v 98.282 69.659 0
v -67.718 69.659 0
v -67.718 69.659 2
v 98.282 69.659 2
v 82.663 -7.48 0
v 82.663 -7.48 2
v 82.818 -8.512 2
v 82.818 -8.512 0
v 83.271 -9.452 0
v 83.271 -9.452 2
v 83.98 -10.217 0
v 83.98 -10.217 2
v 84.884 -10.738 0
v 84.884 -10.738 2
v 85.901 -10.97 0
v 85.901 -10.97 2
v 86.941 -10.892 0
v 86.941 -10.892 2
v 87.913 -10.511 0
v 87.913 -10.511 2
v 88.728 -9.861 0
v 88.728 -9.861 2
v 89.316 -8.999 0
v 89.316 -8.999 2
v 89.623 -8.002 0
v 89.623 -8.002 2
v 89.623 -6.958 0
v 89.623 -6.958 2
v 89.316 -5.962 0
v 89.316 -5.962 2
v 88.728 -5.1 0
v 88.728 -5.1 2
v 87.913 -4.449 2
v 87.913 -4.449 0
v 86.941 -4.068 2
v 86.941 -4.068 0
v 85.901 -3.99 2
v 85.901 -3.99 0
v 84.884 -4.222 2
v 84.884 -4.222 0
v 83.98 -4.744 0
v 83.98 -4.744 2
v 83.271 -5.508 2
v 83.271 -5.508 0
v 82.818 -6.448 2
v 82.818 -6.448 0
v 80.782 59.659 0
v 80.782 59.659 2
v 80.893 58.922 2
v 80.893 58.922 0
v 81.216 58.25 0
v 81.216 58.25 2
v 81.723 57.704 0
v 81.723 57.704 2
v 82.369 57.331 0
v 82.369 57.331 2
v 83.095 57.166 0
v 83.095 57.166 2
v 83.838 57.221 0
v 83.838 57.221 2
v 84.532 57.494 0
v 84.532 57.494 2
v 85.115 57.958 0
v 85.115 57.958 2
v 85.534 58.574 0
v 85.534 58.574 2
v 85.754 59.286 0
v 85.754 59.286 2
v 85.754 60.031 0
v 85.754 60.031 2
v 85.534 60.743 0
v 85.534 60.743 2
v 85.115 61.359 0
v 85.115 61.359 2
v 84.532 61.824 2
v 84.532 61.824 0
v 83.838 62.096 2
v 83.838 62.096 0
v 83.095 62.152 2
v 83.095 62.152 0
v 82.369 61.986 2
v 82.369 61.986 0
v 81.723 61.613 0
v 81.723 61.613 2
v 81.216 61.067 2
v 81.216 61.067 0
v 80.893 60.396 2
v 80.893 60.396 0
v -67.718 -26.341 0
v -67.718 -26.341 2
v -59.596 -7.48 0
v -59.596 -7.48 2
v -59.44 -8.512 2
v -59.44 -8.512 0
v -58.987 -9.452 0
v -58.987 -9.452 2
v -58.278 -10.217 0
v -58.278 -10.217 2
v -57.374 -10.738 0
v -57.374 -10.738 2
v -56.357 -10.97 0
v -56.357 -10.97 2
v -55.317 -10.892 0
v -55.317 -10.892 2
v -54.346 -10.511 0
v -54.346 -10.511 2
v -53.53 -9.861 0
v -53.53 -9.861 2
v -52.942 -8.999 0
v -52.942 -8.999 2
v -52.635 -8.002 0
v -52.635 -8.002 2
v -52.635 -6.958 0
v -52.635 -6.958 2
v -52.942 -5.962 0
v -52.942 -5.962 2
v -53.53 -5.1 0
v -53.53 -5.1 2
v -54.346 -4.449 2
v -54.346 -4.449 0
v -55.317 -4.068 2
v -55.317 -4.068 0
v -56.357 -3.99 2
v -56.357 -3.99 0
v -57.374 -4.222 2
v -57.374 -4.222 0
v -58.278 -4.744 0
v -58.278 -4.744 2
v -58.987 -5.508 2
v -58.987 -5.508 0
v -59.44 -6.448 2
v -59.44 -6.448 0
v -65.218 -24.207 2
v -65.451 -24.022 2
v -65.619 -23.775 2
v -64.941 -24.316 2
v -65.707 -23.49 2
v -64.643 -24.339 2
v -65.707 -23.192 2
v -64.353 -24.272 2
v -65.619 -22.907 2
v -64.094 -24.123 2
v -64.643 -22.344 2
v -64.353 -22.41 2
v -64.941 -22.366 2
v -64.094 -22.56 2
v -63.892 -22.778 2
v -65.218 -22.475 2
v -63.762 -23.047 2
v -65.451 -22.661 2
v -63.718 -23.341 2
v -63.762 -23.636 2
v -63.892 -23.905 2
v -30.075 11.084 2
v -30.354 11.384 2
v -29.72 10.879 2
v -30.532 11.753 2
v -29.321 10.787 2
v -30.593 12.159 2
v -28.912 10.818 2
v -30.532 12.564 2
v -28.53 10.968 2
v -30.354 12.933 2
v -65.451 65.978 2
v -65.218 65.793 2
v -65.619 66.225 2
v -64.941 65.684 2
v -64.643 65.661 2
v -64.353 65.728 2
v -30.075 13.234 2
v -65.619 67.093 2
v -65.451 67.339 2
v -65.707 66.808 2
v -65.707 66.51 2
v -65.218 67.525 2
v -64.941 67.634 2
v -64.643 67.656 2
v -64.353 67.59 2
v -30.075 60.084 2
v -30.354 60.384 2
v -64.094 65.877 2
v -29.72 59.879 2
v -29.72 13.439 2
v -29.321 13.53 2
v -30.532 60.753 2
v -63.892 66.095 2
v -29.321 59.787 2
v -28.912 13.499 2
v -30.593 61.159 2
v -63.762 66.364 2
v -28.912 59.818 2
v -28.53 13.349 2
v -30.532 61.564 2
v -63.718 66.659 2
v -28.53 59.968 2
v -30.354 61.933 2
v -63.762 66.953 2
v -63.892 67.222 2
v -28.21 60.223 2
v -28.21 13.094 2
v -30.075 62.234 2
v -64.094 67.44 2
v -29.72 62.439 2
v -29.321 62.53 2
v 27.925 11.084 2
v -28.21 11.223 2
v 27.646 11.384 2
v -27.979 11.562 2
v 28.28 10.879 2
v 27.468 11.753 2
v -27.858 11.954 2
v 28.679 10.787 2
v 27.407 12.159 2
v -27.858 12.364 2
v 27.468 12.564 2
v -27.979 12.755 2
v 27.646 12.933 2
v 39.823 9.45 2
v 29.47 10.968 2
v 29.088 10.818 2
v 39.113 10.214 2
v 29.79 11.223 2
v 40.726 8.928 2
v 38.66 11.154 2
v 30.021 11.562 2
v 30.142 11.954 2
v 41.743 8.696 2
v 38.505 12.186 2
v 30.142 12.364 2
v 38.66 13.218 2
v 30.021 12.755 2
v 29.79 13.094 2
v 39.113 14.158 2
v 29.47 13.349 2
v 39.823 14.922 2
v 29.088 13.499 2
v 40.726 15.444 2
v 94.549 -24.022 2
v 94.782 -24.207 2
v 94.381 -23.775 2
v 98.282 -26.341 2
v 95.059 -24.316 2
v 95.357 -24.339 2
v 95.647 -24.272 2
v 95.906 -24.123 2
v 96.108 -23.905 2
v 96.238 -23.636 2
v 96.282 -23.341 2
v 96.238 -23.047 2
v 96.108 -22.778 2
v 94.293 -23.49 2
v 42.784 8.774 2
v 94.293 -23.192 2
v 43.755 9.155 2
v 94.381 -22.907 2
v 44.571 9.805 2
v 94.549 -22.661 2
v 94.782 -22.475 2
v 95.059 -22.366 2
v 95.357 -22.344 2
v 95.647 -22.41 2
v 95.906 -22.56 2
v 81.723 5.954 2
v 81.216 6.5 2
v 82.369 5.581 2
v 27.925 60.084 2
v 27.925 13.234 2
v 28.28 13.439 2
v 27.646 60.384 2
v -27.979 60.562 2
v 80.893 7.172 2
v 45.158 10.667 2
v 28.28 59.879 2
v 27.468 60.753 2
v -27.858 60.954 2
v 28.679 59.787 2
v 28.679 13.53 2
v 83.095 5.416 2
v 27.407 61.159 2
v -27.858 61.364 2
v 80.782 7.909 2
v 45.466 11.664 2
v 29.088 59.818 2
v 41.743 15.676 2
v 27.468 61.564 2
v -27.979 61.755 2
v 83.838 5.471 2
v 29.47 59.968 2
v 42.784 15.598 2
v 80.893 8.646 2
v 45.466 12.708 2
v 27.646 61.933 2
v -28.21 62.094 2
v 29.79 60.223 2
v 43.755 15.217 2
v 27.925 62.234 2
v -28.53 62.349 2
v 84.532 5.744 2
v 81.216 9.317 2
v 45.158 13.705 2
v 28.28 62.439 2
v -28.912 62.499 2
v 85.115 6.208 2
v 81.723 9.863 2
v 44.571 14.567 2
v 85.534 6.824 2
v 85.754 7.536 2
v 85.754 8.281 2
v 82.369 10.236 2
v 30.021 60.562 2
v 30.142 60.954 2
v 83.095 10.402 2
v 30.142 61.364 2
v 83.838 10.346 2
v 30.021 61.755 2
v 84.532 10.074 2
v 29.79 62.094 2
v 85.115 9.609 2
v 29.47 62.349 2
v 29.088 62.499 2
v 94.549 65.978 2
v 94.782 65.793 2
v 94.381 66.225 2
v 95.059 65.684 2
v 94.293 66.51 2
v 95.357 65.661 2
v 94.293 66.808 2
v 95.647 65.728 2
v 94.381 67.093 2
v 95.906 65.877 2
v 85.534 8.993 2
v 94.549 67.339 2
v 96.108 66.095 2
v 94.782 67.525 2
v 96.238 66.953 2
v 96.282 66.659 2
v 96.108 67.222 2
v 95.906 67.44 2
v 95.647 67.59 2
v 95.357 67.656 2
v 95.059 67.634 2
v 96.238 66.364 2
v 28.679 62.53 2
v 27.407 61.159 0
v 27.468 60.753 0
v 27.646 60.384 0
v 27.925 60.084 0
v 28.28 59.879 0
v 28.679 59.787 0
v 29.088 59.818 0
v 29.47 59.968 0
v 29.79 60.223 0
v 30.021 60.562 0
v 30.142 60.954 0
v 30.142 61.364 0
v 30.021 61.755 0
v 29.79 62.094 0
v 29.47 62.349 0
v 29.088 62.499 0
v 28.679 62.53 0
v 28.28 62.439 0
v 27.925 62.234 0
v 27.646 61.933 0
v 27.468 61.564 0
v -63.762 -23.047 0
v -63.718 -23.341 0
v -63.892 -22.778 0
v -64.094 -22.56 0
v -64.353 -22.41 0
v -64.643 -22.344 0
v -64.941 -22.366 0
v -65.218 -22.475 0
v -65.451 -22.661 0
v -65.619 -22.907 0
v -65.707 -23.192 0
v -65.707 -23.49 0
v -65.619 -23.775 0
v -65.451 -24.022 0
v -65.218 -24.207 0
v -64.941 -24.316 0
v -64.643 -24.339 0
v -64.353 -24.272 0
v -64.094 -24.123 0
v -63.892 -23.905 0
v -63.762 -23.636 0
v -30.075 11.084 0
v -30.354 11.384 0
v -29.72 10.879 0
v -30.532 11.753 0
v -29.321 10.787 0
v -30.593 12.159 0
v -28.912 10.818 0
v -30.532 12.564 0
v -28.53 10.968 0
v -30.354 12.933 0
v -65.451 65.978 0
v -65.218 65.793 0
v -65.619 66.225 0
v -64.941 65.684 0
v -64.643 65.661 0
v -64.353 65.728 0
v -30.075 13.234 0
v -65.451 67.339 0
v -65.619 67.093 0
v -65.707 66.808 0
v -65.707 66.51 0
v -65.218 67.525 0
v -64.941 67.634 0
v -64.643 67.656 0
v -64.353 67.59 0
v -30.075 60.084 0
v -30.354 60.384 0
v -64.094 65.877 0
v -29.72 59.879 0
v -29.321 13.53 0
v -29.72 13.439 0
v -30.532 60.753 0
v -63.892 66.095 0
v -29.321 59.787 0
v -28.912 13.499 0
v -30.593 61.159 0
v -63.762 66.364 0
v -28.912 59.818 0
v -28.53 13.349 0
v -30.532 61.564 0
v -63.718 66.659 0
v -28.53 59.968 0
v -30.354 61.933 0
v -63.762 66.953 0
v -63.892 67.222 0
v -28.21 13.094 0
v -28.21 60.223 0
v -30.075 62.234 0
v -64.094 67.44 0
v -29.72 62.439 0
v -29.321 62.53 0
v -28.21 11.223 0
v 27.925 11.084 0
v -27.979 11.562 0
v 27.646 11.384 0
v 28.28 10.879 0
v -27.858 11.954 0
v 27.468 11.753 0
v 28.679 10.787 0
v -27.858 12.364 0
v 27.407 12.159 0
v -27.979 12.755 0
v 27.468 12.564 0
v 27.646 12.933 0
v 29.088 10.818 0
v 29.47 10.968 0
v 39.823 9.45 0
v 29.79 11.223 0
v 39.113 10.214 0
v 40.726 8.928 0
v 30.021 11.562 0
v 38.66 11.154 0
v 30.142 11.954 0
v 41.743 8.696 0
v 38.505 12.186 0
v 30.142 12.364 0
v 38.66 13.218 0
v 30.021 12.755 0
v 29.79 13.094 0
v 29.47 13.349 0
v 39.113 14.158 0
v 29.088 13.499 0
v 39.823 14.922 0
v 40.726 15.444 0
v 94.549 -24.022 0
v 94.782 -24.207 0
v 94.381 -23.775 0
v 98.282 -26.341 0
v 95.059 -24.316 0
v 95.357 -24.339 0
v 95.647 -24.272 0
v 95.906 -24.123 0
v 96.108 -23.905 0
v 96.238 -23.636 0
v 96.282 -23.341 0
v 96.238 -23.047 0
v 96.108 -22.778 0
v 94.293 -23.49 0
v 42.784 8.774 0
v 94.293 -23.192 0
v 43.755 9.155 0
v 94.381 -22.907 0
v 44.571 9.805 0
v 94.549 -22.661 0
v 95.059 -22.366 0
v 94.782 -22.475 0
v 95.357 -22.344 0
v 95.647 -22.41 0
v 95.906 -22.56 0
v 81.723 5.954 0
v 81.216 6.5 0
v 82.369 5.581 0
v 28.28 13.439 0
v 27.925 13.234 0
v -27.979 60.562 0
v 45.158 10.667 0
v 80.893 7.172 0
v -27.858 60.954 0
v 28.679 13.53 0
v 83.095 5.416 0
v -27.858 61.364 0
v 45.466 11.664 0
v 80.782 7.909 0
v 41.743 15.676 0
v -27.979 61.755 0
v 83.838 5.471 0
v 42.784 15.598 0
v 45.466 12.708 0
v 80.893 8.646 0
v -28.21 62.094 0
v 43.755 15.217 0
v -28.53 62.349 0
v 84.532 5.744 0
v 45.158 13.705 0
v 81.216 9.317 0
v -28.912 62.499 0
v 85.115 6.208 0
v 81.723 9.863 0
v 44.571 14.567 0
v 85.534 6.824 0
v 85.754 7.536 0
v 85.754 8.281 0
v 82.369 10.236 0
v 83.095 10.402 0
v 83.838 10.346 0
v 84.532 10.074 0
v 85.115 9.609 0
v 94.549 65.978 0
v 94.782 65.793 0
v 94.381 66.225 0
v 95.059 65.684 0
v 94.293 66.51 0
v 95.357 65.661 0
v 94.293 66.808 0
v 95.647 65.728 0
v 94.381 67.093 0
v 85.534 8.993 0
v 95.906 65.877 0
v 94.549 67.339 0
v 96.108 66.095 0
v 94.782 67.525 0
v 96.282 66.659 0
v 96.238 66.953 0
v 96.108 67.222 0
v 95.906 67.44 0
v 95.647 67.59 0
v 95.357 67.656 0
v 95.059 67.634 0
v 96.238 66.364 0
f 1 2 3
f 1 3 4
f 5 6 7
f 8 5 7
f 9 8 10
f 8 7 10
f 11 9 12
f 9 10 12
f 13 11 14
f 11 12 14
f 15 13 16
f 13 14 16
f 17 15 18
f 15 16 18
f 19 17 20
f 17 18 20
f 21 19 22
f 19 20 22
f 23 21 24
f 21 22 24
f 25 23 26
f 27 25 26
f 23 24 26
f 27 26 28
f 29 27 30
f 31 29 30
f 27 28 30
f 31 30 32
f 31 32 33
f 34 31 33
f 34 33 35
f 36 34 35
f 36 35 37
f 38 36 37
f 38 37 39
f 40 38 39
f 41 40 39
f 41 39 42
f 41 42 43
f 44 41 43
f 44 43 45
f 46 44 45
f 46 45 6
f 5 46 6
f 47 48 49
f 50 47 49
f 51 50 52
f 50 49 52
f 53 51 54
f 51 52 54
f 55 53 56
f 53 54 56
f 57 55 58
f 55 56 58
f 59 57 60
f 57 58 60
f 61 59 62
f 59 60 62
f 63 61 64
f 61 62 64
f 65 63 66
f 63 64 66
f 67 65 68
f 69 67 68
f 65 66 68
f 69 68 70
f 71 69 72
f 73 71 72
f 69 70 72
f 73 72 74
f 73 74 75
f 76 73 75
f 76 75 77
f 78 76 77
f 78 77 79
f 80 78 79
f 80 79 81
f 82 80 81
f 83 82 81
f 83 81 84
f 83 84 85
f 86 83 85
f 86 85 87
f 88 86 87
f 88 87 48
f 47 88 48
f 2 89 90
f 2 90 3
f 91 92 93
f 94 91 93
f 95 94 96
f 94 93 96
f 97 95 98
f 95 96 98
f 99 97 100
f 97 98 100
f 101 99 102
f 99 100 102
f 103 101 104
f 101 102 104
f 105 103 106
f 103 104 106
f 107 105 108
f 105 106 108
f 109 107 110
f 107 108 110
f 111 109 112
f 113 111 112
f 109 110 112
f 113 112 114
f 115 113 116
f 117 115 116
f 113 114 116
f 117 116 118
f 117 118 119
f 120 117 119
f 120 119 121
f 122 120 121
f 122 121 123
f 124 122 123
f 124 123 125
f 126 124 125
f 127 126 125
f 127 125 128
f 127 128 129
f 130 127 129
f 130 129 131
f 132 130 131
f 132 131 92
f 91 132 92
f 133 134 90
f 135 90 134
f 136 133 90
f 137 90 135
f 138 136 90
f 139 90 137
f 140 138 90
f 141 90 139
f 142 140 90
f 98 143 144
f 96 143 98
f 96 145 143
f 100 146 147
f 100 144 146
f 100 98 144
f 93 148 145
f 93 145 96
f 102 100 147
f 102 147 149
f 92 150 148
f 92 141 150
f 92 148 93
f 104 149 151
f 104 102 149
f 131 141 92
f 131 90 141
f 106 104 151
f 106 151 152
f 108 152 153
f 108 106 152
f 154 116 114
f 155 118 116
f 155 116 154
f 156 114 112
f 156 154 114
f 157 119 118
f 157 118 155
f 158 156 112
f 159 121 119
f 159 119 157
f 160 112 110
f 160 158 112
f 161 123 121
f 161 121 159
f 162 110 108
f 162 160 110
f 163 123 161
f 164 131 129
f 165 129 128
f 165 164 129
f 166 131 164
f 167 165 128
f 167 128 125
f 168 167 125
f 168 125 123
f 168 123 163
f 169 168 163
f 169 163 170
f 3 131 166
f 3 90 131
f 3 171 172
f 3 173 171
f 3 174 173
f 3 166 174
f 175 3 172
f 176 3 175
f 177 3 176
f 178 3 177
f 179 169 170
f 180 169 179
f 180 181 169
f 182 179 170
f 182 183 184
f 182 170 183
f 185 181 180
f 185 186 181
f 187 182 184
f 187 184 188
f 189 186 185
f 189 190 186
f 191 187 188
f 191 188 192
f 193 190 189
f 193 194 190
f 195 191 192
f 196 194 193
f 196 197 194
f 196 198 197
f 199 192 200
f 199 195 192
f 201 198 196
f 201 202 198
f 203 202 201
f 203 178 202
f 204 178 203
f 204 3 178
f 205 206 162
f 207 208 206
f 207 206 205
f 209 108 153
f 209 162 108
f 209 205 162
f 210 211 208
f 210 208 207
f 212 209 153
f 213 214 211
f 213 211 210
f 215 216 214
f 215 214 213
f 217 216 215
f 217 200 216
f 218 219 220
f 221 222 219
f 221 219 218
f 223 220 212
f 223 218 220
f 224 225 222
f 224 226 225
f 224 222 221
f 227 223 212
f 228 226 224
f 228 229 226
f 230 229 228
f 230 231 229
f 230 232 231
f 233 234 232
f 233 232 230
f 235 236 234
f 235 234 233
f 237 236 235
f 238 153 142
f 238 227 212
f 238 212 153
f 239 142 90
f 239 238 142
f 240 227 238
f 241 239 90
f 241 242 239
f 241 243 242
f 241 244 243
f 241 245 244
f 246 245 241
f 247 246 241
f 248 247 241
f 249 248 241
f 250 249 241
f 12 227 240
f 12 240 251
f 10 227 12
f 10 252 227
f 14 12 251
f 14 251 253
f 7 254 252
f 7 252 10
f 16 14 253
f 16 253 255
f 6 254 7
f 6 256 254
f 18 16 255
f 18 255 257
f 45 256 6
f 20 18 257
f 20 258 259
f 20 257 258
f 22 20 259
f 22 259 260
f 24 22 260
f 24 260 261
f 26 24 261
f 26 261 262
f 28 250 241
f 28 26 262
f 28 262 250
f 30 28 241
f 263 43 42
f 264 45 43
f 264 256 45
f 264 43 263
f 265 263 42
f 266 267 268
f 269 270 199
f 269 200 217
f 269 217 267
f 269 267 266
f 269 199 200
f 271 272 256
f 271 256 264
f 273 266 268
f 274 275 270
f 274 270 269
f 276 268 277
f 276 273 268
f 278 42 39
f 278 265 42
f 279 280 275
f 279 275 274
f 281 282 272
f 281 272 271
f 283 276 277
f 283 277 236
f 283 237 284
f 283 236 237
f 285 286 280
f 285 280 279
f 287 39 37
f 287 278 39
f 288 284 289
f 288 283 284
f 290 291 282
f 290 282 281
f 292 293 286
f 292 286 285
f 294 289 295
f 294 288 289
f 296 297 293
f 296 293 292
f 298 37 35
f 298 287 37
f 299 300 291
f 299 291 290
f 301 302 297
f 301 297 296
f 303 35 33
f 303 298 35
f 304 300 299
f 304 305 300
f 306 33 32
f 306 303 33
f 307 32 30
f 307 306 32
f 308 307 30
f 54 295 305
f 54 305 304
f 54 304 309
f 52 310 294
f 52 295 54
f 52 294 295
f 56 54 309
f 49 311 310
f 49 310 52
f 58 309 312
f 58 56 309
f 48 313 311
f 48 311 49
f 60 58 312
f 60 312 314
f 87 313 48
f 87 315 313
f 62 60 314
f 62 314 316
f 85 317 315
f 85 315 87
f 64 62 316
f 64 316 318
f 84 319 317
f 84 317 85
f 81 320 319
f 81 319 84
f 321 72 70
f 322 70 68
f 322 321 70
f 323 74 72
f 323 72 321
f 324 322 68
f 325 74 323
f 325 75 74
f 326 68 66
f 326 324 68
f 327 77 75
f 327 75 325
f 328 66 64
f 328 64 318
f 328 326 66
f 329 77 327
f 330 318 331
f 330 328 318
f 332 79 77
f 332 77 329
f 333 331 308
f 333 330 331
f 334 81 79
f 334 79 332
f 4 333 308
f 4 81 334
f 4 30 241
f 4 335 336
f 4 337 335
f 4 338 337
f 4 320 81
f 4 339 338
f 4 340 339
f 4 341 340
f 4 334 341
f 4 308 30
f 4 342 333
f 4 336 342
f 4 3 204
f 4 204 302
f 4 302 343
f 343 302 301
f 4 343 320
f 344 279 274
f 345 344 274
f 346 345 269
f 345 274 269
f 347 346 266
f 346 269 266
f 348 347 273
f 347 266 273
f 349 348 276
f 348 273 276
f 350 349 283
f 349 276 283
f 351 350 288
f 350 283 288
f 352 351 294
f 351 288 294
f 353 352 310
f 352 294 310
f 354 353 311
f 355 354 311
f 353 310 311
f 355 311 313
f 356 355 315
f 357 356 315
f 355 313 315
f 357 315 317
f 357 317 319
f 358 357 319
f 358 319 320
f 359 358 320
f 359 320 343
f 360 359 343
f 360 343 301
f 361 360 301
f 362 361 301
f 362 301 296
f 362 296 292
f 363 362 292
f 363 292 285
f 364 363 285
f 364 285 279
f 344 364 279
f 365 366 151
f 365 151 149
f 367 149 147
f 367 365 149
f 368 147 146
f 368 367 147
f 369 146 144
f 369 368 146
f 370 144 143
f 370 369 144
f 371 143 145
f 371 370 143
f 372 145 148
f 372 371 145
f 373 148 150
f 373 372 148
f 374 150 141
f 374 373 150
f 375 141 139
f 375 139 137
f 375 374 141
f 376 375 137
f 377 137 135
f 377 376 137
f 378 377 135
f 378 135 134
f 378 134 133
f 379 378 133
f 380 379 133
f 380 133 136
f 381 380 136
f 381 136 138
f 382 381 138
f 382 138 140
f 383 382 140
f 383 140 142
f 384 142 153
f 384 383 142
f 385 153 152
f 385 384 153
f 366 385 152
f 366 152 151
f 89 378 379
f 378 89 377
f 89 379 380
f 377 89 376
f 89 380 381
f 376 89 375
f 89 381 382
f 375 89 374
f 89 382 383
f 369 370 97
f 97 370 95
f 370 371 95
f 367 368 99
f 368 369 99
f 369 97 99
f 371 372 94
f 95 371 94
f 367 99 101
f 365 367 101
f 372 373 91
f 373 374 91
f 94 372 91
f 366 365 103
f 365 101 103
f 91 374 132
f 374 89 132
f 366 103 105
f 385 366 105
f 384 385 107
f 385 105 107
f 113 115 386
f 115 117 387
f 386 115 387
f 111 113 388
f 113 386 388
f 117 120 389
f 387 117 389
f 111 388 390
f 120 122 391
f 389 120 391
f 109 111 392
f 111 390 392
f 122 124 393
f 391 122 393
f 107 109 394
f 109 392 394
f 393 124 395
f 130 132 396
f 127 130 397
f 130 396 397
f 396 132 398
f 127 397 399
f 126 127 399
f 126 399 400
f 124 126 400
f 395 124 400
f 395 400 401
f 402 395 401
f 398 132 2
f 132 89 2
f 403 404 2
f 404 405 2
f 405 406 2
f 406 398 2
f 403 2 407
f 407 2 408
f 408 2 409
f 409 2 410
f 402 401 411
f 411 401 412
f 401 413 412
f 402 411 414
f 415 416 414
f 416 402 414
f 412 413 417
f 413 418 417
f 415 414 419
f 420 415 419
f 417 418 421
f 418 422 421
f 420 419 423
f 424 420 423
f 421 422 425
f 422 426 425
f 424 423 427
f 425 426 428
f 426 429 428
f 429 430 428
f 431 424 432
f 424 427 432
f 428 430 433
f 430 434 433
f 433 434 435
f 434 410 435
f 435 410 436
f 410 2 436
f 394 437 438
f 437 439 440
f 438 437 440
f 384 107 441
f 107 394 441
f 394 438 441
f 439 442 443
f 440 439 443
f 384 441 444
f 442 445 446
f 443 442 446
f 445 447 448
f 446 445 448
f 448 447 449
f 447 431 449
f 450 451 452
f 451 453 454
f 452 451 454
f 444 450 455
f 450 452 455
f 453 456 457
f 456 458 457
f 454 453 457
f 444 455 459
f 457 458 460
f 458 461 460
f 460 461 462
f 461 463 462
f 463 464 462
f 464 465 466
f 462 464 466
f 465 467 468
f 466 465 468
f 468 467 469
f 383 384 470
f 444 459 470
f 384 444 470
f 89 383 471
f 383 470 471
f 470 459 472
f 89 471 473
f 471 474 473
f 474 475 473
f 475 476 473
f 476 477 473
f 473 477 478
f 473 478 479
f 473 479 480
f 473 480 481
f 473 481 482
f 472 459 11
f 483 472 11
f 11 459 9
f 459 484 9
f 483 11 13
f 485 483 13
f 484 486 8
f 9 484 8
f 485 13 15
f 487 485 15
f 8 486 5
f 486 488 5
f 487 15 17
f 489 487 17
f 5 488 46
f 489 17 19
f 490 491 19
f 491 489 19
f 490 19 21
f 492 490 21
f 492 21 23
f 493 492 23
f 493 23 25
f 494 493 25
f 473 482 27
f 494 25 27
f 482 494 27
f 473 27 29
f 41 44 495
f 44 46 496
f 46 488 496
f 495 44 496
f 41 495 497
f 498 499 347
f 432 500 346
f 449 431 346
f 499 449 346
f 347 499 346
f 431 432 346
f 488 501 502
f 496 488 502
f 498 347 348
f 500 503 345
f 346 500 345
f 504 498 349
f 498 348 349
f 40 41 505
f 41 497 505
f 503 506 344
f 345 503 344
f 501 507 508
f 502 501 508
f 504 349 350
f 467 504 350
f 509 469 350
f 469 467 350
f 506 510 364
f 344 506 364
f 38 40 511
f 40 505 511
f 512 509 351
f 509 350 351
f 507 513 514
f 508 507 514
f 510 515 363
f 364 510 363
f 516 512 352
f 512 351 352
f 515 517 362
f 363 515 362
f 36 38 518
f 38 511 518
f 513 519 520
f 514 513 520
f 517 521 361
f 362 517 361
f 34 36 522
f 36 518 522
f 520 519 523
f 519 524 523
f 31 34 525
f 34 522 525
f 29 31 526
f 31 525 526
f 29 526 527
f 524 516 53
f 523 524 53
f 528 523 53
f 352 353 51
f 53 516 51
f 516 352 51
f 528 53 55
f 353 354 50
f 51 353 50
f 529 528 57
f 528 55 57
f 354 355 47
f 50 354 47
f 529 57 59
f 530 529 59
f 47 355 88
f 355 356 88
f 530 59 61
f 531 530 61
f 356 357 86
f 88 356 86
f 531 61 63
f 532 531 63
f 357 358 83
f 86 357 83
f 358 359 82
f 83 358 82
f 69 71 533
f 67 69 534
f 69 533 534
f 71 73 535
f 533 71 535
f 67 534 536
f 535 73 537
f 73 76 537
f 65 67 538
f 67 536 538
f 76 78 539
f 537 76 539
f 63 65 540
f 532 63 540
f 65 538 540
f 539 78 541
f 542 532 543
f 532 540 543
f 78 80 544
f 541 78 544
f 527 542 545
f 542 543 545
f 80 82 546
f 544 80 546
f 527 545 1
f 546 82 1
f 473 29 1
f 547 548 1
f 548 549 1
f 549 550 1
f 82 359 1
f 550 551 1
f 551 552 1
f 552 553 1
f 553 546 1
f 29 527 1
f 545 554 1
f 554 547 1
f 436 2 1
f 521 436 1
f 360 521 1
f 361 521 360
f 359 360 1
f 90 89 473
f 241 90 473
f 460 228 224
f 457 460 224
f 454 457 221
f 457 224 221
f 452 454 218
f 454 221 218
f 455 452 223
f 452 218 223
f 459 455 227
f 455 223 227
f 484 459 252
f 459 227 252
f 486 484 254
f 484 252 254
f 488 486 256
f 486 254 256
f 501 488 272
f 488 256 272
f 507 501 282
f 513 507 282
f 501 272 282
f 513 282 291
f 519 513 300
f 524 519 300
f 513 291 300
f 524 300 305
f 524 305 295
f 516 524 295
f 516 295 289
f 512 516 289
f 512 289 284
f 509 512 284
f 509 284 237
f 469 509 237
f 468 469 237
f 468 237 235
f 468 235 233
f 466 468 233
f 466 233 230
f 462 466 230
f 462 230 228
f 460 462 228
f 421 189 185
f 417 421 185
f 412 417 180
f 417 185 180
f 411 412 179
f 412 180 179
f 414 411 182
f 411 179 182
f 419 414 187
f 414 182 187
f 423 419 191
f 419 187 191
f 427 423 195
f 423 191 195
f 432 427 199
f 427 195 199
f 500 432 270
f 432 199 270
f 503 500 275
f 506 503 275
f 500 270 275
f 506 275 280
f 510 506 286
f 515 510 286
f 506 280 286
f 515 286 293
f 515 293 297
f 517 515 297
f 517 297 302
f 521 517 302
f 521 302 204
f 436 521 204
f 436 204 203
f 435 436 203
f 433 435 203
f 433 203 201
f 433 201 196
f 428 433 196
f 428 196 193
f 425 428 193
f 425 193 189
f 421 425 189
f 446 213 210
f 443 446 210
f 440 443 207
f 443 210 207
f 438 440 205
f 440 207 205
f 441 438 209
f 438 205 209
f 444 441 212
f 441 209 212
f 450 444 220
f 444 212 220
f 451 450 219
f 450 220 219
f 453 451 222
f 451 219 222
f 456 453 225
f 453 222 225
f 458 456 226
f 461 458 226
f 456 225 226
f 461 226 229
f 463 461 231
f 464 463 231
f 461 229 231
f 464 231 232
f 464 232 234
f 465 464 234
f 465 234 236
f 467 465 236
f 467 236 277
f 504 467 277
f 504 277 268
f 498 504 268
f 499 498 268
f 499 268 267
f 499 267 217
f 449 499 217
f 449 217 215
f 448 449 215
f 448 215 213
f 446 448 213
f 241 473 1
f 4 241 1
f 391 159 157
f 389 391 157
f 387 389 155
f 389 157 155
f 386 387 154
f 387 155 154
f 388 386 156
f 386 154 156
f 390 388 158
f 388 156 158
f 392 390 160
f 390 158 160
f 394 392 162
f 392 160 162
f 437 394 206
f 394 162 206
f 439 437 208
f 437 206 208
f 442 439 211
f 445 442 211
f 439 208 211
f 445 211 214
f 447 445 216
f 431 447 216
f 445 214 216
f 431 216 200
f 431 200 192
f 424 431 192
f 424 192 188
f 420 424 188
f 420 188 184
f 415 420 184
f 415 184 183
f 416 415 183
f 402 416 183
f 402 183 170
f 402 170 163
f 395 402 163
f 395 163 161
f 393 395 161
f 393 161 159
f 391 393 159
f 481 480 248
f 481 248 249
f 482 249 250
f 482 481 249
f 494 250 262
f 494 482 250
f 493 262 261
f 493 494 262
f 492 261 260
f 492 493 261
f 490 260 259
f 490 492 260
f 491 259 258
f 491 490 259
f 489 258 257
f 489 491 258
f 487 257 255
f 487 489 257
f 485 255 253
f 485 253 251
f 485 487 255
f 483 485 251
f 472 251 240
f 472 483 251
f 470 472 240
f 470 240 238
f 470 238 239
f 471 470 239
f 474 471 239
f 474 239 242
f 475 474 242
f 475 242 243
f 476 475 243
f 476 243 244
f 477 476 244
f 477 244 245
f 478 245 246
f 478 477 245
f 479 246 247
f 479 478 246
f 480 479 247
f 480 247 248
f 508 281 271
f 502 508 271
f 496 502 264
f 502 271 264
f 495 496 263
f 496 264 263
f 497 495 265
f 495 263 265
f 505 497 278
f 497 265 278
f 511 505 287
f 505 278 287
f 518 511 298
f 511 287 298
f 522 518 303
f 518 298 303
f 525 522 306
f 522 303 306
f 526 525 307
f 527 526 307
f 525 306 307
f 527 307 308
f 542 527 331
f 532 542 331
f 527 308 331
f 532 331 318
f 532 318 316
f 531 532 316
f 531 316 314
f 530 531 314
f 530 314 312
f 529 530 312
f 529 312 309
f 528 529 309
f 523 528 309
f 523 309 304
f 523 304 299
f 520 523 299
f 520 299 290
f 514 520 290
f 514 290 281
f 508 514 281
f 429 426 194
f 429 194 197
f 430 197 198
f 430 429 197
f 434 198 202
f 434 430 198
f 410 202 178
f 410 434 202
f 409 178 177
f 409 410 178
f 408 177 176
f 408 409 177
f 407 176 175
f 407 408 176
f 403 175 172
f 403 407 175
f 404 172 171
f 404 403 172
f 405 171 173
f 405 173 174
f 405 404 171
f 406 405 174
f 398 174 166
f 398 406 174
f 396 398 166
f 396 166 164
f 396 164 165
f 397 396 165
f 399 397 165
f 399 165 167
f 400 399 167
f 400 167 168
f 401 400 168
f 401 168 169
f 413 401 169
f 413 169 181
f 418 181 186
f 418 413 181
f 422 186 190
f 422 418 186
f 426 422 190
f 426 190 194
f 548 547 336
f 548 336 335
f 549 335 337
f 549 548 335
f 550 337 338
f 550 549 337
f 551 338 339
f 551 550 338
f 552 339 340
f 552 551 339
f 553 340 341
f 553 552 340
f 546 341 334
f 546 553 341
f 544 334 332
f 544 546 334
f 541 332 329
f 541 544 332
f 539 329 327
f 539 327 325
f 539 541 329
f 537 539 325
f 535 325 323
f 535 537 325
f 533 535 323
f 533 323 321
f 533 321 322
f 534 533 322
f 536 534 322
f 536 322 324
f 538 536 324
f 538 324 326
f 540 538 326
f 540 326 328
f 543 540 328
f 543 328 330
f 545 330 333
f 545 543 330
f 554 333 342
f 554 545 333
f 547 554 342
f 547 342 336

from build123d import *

# Parameters (mm, degrees)
F0_W     = 166
F0_H     = 96
F0_R     = 1
F1_DEPTH = 2
F3_D     = 5
F3_DEPTH = 12
F3_TIP   = 1.5021515476
F4_D     = 2.75
F4_DEPTH = 12
F4_TIP   = 0.8261833512
F5_D     = 7
F5_DEPTH = 12
F5_TIP   = 2.1030121666


with BuildPart() as f1:
    # F0 (on Top) → F1 (new body)
    with BuildSketch(Plane.XY):
        with Locations((15.2820143104, 21.6586496021)):
            Rectangle(F0_W, F0_H)
        with Locations((-64.7179856896, -23.3413503979)):
            Circle(F0_R, mode=Mode.SUBTRACT)
        with Locations((95.2820143104, -23.3413503979)):
            Circle(F0_R, mode=Mode.SUBTRACT)
        with Locations((-64.7179856896, 66.6586496021)):
            Circle(F0_R, mode=Mode.SUBTRACT)
        with Locations((95.2820143104, 66.6586496021)):
            Circle(F0_R, mode=Mode.SUBTRACT)
    extrude(amount=F1_DEPTH)

    # F3
    with Locations(Plane(origin=(0, 0, 0), x_dir=(1, 0, 0), z_dir=(0, 0, -1))):
        with Locations((83.2820143104, -59.6586496021), (83.2820143104, -7.9086496021)):
            Hole(F3_D / 2, depth=F3_DEPTH)
            with Locations((0, 0, -(F3_DEPTH + F3_TIP / 2))):  # 118° drill point
                Cone(0, F3_D / 2, F3_TIP, mode=Mode.SUBTRACT)

    # F4
    with Locations(Plane(origin=(0, 0, 0), x_dir=(1, 0, 0), z_dir=(0, 0, -1))):
        with Locations((-29.2179856896, -61.1586496021), (-29.2179856896, -12.1586496021), (28.7820143104, -12.1586496021), (28.7820143104, -61.1586496021)):
            Hole(F4_D / 2, depth=F4_DEPTH)
            with Locations((0, 0, -(F4_DEPTH + F4_TIP / 2))):  # 118° drill point
                Cone(0, F4_D / 2, F4_TIP, mode=Mode.SUBTRACT)

    # F5
    with Locations(Plane(origin=(0, 0, 0), x_dir=(1, 0, 0), z_dir=(0, 0, -1))):
        with Locations((-56.0955218971, 7.4801053852), (86.1625224352, 7.4801053852), (42.0048907399, -12.1859554201)):
            Hole(F5_D / 2, depth=F5_DEPTH)
            with Locations((0, 0, -(F5_DEPTH + F5_TIP / 2))):  # 118° drill point
                Cone(0, F5_D / 2, F5_TIP, mode=Mode.SUBTRACT)


solid = f1.part
